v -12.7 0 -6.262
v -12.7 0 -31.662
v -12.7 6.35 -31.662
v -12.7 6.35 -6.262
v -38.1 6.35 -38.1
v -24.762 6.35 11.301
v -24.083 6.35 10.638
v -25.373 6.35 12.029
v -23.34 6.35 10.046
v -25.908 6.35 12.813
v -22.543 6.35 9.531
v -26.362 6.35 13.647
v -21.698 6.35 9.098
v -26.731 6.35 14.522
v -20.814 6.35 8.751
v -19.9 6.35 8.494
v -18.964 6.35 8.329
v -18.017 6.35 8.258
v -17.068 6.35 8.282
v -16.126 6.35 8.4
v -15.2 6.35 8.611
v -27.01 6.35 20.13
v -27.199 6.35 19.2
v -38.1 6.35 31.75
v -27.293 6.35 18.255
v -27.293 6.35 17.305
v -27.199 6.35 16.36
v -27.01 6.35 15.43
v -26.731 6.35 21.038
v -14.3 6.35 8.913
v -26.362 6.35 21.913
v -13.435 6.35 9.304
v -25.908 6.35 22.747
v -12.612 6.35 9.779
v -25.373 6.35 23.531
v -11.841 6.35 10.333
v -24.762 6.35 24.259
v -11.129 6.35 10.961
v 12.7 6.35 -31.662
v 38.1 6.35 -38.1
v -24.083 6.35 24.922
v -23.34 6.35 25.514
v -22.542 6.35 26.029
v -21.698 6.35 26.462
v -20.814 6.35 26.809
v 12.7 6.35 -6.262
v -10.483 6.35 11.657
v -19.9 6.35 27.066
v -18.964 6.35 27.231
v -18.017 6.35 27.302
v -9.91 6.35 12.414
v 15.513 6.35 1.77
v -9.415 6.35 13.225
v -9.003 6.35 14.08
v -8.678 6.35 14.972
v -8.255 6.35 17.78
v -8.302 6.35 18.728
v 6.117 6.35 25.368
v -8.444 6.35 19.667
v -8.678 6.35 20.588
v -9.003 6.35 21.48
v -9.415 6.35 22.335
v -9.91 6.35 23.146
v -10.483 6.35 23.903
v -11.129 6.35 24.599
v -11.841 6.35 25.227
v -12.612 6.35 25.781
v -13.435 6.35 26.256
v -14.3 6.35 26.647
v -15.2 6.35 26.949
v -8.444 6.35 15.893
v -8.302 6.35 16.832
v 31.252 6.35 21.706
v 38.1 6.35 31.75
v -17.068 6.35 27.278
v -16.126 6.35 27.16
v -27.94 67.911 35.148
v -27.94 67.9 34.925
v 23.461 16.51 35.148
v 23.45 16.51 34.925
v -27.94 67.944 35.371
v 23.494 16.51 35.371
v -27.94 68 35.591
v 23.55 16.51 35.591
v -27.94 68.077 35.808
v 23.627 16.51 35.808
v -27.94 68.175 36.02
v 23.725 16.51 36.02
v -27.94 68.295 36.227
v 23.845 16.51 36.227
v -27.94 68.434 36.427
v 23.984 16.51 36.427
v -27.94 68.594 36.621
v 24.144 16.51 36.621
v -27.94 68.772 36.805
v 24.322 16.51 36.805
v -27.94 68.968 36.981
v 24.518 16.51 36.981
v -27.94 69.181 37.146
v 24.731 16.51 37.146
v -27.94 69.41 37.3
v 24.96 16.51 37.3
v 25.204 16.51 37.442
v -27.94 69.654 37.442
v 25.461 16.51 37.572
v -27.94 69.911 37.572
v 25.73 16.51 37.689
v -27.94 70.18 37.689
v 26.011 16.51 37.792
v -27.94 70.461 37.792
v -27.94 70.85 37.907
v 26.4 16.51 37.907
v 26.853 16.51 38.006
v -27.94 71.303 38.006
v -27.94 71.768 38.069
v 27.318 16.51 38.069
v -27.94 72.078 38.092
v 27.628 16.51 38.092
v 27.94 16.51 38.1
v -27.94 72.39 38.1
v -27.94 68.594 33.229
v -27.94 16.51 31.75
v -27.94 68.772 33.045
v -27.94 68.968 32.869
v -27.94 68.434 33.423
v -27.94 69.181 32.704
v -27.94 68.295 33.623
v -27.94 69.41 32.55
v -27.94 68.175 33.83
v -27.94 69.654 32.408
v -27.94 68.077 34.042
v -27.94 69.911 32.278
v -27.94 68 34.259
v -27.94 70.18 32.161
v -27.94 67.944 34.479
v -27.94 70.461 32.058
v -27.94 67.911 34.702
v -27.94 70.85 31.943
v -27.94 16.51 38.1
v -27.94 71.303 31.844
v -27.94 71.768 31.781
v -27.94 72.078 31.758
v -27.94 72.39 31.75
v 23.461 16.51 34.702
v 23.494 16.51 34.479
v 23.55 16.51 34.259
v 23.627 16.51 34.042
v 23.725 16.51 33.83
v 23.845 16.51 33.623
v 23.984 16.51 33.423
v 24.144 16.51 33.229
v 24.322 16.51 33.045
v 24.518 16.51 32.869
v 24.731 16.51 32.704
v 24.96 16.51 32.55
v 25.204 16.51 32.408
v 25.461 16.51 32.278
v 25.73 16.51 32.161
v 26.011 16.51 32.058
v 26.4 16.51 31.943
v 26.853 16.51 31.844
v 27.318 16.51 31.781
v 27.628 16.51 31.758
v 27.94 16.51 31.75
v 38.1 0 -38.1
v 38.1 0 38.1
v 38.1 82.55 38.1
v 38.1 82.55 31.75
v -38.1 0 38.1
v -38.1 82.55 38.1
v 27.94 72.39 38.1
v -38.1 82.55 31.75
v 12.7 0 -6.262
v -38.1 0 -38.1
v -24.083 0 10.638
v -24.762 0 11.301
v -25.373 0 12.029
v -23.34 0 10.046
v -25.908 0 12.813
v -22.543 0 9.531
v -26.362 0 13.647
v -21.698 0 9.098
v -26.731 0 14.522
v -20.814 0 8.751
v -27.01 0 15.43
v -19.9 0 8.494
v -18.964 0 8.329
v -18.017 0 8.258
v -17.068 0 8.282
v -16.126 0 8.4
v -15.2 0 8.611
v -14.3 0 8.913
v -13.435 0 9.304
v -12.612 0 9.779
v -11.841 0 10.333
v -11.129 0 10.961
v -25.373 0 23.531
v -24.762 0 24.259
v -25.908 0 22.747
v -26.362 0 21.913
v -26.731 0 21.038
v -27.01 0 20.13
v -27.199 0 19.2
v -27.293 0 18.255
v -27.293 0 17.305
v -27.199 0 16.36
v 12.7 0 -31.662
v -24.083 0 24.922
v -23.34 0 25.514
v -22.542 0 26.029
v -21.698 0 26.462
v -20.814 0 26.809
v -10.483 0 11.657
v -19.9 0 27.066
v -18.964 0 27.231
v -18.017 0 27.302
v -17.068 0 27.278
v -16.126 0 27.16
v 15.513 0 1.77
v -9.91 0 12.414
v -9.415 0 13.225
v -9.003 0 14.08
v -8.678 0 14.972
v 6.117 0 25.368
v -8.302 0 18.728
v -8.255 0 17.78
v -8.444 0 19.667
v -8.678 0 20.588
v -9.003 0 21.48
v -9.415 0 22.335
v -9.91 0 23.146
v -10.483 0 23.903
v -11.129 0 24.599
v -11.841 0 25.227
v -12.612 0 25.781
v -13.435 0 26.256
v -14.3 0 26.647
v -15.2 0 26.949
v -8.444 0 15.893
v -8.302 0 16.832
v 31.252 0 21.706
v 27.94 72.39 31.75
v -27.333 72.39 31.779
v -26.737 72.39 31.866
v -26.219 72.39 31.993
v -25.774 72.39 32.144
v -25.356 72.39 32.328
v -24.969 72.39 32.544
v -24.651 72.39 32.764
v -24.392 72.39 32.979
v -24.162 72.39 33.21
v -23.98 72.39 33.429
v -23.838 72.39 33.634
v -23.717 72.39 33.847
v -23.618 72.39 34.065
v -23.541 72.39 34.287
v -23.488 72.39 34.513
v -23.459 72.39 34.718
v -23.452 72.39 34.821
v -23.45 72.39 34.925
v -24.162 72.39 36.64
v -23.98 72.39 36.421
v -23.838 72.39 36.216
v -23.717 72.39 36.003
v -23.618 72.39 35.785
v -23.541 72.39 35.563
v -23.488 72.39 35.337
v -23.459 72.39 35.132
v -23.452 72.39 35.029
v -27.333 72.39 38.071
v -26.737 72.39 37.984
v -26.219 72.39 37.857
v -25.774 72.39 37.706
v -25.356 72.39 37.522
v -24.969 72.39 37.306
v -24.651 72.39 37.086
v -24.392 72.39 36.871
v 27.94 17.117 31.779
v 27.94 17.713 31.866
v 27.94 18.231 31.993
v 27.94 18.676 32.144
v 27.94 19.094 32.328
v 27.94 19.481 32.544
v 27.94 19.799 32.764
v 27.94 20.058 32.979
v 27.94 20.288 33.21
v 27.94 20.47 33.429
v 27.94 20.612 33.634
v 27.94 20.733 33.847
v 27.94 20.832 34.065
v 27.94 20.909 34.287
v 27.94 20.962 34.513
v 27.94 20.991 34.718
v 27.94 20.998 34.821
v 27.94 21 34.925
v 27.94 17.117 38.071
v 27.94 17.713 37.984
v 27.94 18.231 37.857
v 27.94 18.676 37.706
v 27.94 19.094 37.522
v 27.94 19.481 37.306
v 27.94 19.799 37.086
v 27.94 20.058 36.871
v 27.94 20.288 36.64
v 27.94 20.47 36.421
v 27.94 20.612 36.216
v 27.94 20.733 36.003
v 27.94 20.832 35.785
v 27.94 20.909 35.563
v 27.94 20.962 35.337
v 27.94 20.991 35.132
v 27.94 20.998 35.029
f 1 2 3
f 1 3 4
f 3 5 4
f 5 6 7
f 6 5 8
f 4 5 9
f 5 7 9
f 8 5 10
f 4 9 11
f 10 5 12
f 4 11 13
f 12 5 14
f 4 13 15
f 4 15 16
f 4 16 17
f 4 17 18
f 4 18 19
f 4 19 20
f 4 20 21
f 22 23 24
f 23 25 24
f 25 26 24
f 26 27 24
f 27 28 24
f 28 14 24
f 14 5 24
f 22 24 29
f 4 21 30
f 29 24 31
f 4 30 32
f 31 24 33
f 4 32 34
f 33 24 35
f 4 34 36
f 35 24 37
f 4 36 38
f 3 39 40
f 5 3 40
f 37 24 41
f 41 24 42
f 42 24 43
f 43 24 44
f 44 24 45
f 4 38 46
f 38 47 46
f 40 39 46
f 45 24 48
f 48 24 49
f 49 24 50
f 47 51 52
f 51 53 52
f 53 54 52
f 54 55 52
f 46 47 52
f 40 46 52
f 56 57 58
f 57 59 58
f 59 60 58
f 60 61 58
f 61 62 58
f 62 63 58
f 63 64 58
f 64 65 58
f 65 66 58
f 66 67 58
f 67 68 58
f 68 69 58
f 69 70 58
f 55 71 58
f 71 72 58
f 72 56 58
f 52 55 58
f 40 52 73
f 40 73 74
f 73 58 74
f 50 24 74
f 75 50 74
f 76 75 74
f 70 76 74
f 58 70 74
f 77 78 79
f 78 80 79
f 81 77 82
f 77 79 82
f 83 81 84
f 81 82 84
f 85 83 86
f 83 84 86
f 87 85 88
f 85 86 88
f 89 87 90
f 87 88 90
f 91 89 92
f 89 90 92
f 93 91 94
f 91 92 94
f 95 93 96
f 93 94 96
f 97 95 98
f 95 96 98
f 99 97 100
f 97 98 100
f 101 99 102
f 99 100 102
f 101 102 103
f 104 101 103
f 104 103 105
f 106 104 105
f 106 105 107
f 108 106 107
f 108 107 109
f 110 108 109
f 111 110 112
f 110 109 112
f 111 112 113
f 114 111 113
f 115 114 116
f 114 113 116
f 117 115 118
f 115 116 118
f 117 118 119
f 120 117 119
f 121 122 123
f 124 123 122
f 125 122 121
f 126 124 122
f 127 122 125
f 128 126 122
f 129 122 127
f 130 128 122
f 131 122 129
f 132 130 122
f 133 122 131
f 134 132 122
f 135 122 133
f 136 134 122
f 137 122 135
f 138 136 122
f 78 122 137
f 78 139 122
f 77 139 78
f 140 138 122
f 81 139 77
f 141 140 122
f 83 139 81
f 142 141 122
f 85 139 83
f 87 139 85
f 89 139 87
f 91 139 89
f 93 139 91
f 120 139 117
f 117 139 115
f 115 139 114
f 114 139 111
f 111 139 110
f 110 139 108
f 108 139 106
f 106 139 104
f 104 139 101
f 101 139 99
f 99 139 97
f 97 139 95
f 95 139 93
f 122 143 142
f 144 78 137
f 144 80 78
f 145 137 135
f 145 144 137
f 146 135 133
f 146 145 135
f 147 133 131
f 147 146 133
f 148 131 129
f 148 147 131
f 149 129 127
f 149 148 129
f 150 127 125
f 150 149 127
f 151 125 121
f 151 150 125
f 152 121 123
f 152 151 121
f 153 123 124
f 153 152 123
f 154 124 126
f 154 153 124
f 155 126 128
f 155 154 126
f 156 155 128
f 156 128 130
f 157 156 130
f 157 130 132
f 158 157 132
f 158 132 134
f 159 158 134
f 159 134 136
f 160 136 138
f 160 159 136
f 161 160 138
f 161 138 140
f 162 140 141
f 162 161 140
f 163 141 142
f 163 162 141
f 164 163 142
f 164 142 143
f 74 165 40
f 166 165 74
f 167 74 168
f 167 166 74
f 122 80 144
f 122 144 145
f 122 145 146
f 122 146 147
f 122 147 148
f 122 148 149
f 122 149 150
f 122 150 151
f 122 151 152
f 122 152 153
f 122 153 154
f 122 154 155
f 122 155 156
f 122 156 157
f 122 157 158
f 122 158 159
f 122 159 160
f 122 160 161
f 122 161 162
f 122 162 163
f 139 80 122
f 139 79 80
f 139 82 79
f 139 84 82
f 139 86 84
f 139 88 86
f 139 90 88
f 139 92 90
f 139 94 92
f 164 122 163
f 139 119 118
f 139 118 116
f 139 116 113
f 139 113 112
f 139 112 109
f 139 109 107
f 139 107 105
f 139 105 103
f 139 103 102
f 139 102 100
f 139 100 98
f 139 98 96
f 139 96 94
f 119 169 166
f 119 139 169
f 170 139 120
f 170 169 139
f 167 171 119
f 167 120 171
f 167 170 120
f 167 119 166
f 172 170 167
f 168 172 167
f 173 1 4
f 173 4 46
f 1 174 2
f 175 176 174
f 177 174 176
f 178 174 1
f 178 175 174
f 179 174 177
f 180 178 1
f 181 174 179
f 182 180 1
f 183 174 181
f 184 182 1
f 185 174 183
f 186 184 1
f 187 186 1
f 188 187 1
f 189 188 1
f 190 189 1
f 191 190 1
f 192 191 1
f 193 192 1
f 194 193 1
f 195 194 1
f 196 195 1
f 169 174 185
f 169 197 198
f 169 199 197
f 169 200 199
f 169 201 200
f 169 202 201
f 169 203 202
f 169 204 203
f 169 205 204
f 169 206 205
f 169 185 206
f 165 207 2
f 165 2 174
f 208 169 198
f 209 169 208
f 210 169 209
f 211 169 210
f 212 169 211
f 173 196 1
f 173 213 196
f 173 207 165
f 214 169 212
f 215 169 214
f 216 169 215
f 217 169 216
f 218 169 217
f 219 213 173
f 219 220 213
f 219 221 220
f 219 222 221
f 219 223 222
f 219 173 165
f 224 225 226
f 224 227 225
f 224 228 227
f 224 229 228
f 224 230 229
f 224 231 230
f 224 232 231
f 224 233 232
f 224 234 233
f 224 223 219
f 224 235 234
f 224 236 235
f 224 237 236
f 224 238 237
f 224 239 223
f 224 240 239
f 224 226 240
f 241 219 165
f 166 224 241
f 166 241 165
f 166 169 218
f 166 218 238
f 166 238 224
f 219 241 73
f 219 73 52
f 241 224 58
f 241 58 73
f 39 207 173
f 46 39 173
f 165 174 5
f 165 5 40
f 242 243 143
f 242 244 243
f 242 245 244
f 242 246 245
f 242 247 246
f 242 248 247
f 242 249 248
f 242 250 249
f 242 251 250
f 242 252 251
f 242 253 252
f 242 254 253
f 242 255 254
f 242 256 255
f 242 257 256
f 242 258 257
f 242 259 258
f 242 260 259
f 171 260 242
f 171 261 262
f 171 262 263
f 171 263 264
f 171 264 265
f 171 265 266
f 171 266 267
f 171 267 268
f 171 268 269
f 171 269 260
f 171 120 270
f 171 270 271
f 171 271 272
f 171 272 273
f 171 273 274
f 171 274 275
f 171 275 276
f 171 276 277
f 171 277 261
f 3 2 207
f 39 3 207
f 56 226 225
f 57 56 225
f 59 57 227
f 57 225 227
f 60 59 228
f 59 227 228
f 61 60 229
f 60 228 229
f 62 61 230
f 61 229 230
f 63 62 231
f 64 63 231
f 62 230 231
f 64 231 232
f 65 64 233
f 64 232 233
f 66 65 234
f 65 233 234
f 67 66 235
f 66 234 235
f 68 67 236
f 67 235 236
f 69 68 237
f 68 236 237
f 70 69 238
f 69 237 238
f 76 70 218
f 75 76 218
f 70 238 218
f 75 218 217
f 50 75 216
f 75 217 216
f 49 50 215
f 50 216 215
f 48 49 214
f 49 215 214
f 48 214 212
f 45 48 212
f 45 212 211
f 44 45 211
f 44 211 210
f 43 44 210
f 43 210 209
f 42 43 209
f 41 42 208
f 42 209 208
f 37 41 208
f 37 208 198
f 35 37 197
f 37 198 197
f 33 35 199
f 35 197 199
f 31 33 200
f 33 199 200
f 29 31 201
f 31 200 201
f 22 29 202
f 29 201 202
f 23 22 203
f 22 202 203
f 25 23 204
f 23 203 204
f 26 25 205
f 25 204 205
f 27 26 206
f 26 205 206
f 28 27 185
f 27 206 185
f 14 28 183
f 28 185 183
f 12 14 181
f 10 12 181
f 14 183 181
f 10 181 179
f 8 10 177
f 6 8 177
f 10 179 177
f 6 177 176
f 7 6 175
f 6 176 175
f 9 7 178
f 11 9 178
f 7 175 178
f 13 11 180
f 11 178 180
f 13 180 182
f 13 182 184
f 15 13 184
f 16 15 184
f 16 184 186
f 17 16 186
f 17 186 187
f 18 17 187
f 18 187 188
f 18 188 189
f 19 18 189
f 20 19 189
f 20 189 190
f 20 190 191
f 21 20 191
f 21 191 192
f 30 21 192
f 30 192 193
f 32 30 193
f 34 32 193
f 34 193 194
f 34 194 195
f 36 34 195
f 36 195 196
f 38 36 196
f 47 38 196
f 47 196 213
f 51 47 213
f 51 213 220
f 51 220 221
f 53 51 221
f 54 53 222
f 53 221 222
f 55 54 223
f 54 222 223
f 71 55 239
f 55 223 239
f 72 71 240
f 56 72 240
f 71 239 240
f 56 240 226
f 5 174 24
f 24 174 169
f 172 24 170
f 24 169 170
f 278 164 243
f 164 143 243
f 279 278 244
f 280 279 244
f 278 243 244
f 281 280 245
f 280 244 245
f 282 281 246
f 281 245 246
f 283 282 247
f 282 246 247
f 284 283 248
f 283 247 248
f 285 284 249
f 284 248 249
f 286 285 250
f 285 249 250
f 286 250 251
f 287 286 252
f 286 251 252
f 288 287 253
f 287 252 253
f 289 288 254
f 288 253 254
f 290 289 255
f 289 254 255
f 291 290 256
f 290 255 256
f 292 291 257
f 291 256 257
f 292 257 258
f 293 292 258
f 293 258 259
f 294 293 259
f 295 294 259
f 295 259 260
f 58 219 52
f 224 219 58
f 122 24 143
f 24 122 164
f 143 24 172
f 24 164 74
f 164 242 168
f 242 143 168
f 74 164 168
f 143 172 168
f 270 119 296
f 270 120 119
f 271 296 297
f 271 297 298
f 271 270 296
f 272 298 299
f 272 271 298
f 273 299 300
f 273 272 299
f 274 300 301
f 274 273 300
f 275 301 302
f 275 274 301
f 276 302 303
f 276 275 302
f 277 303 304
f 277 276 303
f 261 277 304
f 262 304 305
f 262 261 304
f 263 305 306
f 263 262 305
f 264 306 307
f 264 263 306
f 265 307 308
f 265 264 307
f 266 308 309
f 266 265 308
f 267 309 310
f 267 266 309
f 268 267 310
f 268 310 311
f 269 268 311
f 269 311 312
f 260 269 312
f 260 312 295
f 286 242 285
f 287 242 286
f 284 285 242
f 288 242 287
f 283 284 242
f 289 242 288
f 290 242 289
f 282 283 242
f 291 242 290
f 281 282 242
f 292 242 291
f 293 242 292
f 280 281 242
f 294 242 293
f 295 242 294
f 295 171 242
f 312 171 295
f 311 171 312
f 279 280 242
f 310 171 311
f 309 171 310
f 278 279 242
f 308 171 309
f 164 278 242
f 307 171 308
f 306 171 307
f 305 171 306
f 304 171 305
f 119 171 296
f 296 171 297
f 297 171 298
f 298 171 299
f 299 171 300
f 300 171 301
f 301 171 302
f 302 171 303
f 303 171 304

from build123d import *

# Parameters (mm, degrees)
F0_W     = 76.2
F0_H     = 76.2
F0_W_2   = 25.4
F0_H_2   = 25.4
F0_R     = 9.525
F1_DEPTH = 6.35
F2_W     = 76.2
F2_H     = 76.2
F3_DEPTH = 6.35
F4_DEPTH = 6.35
F5_R     = 3.17499


# Not quite as in the source:
# - a fillet or chamfer is up to 0.001 mm smaller than in the source, because OpenCascade refuses the exact size


with BuildPart() as f1:
    # F0 (on Front) → F1 (new body)
    with BuildSketch(Plane.XZ):
        Rectangle(F0_W, F0_H)
        with Locations((0, -18.9619082958)):
            Rectangle(F0_W_2, F0_H_2, mode=Mode.SUBTRACT)
        with Locations((-17.78, 17.78)):
            Circle(F0_R, mode=Mode.SUBTRACT)
        Polygon((15.5130978999, 1.7698944463), (6.1174177746, 25.3682247894), (31.2520114013, 21.7059572922), align=None, mode=Mode.SUBTRACT)
    extrude(amount=-F1_DEPTH)

    # F2 (on face) → F3 (join)
    with BuildSketch(Plane.XY.offset(38.1)):
        with Locations((0, 44.45)):
            Rectangle(F2_W, F2_H)
        Polygon((-27.94, 67.8998719395), (-27.94, 72.39), (-23.4498719395, 72.39), (27.94, 72.39), (27.94, 21.0001280605), (27.94, 16.51), (23.4498719395, 16.51), (-27.94, 16.51), align=None, mode=Mode.SUBTRACT)
    extrude(amount=-F3_DEPTH)

    # F2 (on face) → F4 (join)
    with BuildSketch(Plane.XY.offset(38.1)):
        Polygon((-23.4498719395, 72.39), (-27.94, 72.39), (-27.94, 67.8998719395), (23.4498719395, 16.51), (27.94, 16.51), (27.94, 21.0001280605), align=None)
    extrude(amount=-F4_DEPTH)

    # F5 (radius 3.175 in the source; OpenCascade refuses exactly that, so slightly less here)
    f5_edges = [f1.edges().sort_by_distance(p)[0] for p in [
        (2.245064, 46.695064, 38.1),
        (-2.245064, 42.204936, 38.1),
        (-2.245064, 42.204936, 31.75),
        (2.245064, 46.695064, 31.75),
    ]]
    fillet(f5_edges, radius=F5_R)


solid = f1.part
